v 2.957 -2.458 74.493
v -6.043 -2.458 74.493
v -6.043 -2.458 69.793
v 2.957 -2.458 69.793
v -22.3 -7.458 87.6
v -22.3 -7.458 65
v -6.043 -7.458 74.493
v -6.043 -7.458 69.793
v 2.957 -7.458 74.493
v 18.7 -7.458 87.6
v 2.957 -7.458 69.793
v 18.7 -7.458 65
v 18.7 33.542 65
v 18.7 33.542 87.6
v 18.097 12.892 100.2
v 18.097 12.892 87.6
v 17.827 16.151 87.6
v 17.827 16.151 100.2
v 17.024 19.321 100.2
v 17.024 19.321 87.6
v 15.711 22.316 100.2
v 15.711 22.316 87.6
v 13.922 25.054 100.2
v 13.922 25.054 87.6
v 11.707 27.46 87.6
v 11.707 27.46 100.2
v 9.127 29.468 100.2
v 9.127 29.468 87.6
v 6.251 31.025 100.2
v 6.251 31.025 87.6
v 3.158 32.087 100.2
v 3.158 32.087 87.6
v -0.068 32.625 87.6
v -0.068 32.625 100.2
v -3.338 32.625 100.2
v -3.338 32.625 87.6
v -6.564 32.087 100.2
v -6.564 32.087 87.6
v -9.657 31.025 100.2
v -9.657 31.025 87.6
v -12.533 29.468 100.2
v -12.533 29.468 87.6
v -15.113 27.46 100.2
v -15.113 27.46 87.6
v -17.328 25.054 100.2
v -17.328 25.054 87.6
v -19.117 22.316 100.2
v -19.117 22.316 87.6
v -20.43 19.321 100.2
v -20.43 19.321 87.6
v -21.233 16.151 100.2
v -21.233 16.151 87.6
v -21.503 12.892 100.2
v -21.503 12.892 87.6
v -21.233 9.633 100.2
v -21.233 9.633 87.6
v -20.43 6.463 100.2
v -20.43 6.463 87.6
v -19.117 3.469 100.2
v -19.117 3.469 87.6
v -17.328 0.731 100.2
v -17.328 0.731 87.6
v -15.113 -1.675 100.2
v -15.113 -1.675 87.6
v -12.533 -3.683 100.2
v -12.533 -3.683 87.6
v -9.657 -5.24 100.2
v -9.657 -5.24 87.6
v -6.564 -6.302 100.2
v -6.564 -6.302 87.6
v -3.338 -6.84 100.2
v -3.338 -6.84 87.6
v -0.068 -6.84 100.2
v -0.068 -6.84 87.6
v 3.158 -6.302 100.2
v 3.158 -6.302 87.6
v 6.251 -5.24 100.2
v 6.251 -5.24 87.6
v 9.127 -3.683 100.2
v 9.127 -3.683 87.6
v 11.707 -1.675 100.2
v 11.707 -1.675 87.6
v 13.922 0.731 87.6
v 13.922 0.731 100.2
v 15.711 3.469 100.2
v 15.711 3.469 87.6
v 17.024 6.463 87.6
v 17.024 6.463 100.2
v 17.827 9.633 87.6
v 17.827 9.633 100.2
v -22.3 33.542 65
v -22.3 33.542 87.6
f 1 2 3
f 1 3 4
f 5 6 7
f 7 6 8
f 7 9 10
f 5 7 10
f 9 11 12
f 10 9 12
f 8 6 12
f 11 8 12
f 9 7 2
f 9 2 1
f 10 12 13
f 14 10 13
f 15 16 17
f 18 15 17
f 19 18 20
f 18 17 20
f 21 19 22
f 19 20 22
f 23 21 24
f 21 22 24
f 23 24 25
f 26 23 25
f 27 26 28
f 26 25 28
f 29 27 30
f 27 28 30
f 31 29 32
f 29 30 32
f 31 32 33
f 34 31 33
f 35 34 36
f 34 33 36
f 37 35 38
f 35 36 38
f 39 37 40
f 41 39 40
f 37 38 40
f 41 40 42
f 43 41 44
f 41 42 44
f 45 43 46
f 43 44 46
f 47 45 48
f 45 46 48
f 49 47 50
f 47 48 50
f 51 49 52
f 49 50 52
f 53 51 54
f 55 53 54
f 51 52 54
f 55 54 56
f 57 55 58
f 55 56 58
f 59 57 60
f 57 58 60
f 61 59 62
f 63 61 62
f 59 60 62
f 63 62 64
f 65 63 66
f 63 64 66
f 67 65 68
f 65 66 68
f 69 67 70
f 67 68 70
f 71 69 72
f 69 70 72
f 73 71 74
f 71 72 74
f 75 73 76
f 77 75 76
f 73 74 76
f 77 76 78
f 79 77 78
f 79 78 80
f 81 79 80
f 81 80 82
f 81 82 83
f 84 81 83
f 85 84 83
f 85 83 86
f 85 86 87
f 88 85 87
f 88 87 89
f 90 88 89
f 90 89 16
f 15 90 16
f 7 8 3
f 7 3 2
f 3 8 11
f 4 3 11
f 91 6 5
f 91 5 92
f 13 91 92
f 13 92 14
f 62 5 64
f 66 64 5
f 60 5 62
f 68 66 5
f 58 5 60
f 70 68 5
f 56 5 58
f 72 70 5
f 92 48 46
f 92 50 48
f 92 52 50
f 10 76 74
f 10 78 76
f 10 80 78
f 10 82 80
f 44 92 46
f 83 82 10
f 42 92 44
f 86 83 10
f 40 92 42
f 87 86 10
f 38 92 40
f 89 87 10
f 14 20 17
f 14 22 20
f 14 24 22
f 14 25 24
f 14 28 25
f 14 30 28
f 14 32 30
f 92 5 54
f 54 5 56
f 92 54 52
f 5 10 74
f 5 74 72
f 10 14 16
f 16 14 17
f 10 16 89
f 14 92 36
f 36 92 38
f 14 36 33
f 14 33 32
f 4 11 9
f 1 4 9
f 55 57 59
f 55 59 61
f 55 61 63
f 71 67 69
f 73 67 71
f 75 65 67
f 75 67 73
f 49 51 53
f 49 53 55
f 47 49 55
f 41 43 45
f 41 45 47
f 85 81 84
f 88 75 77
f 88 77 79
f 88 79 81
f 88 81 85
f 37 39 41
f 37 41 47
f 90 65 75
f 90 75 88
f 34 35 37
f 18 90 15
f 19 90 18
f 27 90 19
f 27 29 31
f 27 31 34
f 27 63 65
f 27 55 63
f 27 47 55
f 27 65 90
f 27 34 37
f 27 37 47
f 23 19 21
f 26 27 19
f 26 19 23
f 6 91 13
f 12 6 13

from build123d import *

# Parameters (mm, degrees)
SKETCH025_W     = 41
SKETCH025_H     = 41
PAD017_DEPTH    = 22.6
SKETCH026_R     = 19.8
PAD018_DEPTH    = 12.6
SKETCH027_W     = 9
SKETCH027_H     = 4.7
POCKET007_DEPTH = 5


with BuildPart() as part:
    # Sketch025 → Pad017 (new body)
    with BuildSketch(Plane.XY):
        with Locations((3.199544, 3.041725)):
            Rectangle(SKETCH025_W, SKETCH025_H)
    extrude(amount=PAD017_DEPTH)

    # Sketch026 (on Face6 of Pad017) → Pad018 (join)
    with BuildSketch(Plane.XY.offset(22.6)):
        with Locations((3.297032, 2.892403)):
            Circle(SKETCH026_R)
    extrude(amount=PAD018_DEPTH)

    # Sketch027 (on Face3 of Pad018) → Pocket007 (cut)
    with BuildSketch(Plane.XZ.offset(17.458275)):
        with Locations((3.457133, 7.14271)):
            Rectangle(SKETCH027_W, SKETCH027_H)
    extrude(amount=-POCKET007_DEPTH, mode=Mode.SUBTRACT)


with BuildPart() as part_1:
    # Body006 placement: moved
    add(part.part.moved(Location((-5, 10, 65))))


solid = part_1.part
